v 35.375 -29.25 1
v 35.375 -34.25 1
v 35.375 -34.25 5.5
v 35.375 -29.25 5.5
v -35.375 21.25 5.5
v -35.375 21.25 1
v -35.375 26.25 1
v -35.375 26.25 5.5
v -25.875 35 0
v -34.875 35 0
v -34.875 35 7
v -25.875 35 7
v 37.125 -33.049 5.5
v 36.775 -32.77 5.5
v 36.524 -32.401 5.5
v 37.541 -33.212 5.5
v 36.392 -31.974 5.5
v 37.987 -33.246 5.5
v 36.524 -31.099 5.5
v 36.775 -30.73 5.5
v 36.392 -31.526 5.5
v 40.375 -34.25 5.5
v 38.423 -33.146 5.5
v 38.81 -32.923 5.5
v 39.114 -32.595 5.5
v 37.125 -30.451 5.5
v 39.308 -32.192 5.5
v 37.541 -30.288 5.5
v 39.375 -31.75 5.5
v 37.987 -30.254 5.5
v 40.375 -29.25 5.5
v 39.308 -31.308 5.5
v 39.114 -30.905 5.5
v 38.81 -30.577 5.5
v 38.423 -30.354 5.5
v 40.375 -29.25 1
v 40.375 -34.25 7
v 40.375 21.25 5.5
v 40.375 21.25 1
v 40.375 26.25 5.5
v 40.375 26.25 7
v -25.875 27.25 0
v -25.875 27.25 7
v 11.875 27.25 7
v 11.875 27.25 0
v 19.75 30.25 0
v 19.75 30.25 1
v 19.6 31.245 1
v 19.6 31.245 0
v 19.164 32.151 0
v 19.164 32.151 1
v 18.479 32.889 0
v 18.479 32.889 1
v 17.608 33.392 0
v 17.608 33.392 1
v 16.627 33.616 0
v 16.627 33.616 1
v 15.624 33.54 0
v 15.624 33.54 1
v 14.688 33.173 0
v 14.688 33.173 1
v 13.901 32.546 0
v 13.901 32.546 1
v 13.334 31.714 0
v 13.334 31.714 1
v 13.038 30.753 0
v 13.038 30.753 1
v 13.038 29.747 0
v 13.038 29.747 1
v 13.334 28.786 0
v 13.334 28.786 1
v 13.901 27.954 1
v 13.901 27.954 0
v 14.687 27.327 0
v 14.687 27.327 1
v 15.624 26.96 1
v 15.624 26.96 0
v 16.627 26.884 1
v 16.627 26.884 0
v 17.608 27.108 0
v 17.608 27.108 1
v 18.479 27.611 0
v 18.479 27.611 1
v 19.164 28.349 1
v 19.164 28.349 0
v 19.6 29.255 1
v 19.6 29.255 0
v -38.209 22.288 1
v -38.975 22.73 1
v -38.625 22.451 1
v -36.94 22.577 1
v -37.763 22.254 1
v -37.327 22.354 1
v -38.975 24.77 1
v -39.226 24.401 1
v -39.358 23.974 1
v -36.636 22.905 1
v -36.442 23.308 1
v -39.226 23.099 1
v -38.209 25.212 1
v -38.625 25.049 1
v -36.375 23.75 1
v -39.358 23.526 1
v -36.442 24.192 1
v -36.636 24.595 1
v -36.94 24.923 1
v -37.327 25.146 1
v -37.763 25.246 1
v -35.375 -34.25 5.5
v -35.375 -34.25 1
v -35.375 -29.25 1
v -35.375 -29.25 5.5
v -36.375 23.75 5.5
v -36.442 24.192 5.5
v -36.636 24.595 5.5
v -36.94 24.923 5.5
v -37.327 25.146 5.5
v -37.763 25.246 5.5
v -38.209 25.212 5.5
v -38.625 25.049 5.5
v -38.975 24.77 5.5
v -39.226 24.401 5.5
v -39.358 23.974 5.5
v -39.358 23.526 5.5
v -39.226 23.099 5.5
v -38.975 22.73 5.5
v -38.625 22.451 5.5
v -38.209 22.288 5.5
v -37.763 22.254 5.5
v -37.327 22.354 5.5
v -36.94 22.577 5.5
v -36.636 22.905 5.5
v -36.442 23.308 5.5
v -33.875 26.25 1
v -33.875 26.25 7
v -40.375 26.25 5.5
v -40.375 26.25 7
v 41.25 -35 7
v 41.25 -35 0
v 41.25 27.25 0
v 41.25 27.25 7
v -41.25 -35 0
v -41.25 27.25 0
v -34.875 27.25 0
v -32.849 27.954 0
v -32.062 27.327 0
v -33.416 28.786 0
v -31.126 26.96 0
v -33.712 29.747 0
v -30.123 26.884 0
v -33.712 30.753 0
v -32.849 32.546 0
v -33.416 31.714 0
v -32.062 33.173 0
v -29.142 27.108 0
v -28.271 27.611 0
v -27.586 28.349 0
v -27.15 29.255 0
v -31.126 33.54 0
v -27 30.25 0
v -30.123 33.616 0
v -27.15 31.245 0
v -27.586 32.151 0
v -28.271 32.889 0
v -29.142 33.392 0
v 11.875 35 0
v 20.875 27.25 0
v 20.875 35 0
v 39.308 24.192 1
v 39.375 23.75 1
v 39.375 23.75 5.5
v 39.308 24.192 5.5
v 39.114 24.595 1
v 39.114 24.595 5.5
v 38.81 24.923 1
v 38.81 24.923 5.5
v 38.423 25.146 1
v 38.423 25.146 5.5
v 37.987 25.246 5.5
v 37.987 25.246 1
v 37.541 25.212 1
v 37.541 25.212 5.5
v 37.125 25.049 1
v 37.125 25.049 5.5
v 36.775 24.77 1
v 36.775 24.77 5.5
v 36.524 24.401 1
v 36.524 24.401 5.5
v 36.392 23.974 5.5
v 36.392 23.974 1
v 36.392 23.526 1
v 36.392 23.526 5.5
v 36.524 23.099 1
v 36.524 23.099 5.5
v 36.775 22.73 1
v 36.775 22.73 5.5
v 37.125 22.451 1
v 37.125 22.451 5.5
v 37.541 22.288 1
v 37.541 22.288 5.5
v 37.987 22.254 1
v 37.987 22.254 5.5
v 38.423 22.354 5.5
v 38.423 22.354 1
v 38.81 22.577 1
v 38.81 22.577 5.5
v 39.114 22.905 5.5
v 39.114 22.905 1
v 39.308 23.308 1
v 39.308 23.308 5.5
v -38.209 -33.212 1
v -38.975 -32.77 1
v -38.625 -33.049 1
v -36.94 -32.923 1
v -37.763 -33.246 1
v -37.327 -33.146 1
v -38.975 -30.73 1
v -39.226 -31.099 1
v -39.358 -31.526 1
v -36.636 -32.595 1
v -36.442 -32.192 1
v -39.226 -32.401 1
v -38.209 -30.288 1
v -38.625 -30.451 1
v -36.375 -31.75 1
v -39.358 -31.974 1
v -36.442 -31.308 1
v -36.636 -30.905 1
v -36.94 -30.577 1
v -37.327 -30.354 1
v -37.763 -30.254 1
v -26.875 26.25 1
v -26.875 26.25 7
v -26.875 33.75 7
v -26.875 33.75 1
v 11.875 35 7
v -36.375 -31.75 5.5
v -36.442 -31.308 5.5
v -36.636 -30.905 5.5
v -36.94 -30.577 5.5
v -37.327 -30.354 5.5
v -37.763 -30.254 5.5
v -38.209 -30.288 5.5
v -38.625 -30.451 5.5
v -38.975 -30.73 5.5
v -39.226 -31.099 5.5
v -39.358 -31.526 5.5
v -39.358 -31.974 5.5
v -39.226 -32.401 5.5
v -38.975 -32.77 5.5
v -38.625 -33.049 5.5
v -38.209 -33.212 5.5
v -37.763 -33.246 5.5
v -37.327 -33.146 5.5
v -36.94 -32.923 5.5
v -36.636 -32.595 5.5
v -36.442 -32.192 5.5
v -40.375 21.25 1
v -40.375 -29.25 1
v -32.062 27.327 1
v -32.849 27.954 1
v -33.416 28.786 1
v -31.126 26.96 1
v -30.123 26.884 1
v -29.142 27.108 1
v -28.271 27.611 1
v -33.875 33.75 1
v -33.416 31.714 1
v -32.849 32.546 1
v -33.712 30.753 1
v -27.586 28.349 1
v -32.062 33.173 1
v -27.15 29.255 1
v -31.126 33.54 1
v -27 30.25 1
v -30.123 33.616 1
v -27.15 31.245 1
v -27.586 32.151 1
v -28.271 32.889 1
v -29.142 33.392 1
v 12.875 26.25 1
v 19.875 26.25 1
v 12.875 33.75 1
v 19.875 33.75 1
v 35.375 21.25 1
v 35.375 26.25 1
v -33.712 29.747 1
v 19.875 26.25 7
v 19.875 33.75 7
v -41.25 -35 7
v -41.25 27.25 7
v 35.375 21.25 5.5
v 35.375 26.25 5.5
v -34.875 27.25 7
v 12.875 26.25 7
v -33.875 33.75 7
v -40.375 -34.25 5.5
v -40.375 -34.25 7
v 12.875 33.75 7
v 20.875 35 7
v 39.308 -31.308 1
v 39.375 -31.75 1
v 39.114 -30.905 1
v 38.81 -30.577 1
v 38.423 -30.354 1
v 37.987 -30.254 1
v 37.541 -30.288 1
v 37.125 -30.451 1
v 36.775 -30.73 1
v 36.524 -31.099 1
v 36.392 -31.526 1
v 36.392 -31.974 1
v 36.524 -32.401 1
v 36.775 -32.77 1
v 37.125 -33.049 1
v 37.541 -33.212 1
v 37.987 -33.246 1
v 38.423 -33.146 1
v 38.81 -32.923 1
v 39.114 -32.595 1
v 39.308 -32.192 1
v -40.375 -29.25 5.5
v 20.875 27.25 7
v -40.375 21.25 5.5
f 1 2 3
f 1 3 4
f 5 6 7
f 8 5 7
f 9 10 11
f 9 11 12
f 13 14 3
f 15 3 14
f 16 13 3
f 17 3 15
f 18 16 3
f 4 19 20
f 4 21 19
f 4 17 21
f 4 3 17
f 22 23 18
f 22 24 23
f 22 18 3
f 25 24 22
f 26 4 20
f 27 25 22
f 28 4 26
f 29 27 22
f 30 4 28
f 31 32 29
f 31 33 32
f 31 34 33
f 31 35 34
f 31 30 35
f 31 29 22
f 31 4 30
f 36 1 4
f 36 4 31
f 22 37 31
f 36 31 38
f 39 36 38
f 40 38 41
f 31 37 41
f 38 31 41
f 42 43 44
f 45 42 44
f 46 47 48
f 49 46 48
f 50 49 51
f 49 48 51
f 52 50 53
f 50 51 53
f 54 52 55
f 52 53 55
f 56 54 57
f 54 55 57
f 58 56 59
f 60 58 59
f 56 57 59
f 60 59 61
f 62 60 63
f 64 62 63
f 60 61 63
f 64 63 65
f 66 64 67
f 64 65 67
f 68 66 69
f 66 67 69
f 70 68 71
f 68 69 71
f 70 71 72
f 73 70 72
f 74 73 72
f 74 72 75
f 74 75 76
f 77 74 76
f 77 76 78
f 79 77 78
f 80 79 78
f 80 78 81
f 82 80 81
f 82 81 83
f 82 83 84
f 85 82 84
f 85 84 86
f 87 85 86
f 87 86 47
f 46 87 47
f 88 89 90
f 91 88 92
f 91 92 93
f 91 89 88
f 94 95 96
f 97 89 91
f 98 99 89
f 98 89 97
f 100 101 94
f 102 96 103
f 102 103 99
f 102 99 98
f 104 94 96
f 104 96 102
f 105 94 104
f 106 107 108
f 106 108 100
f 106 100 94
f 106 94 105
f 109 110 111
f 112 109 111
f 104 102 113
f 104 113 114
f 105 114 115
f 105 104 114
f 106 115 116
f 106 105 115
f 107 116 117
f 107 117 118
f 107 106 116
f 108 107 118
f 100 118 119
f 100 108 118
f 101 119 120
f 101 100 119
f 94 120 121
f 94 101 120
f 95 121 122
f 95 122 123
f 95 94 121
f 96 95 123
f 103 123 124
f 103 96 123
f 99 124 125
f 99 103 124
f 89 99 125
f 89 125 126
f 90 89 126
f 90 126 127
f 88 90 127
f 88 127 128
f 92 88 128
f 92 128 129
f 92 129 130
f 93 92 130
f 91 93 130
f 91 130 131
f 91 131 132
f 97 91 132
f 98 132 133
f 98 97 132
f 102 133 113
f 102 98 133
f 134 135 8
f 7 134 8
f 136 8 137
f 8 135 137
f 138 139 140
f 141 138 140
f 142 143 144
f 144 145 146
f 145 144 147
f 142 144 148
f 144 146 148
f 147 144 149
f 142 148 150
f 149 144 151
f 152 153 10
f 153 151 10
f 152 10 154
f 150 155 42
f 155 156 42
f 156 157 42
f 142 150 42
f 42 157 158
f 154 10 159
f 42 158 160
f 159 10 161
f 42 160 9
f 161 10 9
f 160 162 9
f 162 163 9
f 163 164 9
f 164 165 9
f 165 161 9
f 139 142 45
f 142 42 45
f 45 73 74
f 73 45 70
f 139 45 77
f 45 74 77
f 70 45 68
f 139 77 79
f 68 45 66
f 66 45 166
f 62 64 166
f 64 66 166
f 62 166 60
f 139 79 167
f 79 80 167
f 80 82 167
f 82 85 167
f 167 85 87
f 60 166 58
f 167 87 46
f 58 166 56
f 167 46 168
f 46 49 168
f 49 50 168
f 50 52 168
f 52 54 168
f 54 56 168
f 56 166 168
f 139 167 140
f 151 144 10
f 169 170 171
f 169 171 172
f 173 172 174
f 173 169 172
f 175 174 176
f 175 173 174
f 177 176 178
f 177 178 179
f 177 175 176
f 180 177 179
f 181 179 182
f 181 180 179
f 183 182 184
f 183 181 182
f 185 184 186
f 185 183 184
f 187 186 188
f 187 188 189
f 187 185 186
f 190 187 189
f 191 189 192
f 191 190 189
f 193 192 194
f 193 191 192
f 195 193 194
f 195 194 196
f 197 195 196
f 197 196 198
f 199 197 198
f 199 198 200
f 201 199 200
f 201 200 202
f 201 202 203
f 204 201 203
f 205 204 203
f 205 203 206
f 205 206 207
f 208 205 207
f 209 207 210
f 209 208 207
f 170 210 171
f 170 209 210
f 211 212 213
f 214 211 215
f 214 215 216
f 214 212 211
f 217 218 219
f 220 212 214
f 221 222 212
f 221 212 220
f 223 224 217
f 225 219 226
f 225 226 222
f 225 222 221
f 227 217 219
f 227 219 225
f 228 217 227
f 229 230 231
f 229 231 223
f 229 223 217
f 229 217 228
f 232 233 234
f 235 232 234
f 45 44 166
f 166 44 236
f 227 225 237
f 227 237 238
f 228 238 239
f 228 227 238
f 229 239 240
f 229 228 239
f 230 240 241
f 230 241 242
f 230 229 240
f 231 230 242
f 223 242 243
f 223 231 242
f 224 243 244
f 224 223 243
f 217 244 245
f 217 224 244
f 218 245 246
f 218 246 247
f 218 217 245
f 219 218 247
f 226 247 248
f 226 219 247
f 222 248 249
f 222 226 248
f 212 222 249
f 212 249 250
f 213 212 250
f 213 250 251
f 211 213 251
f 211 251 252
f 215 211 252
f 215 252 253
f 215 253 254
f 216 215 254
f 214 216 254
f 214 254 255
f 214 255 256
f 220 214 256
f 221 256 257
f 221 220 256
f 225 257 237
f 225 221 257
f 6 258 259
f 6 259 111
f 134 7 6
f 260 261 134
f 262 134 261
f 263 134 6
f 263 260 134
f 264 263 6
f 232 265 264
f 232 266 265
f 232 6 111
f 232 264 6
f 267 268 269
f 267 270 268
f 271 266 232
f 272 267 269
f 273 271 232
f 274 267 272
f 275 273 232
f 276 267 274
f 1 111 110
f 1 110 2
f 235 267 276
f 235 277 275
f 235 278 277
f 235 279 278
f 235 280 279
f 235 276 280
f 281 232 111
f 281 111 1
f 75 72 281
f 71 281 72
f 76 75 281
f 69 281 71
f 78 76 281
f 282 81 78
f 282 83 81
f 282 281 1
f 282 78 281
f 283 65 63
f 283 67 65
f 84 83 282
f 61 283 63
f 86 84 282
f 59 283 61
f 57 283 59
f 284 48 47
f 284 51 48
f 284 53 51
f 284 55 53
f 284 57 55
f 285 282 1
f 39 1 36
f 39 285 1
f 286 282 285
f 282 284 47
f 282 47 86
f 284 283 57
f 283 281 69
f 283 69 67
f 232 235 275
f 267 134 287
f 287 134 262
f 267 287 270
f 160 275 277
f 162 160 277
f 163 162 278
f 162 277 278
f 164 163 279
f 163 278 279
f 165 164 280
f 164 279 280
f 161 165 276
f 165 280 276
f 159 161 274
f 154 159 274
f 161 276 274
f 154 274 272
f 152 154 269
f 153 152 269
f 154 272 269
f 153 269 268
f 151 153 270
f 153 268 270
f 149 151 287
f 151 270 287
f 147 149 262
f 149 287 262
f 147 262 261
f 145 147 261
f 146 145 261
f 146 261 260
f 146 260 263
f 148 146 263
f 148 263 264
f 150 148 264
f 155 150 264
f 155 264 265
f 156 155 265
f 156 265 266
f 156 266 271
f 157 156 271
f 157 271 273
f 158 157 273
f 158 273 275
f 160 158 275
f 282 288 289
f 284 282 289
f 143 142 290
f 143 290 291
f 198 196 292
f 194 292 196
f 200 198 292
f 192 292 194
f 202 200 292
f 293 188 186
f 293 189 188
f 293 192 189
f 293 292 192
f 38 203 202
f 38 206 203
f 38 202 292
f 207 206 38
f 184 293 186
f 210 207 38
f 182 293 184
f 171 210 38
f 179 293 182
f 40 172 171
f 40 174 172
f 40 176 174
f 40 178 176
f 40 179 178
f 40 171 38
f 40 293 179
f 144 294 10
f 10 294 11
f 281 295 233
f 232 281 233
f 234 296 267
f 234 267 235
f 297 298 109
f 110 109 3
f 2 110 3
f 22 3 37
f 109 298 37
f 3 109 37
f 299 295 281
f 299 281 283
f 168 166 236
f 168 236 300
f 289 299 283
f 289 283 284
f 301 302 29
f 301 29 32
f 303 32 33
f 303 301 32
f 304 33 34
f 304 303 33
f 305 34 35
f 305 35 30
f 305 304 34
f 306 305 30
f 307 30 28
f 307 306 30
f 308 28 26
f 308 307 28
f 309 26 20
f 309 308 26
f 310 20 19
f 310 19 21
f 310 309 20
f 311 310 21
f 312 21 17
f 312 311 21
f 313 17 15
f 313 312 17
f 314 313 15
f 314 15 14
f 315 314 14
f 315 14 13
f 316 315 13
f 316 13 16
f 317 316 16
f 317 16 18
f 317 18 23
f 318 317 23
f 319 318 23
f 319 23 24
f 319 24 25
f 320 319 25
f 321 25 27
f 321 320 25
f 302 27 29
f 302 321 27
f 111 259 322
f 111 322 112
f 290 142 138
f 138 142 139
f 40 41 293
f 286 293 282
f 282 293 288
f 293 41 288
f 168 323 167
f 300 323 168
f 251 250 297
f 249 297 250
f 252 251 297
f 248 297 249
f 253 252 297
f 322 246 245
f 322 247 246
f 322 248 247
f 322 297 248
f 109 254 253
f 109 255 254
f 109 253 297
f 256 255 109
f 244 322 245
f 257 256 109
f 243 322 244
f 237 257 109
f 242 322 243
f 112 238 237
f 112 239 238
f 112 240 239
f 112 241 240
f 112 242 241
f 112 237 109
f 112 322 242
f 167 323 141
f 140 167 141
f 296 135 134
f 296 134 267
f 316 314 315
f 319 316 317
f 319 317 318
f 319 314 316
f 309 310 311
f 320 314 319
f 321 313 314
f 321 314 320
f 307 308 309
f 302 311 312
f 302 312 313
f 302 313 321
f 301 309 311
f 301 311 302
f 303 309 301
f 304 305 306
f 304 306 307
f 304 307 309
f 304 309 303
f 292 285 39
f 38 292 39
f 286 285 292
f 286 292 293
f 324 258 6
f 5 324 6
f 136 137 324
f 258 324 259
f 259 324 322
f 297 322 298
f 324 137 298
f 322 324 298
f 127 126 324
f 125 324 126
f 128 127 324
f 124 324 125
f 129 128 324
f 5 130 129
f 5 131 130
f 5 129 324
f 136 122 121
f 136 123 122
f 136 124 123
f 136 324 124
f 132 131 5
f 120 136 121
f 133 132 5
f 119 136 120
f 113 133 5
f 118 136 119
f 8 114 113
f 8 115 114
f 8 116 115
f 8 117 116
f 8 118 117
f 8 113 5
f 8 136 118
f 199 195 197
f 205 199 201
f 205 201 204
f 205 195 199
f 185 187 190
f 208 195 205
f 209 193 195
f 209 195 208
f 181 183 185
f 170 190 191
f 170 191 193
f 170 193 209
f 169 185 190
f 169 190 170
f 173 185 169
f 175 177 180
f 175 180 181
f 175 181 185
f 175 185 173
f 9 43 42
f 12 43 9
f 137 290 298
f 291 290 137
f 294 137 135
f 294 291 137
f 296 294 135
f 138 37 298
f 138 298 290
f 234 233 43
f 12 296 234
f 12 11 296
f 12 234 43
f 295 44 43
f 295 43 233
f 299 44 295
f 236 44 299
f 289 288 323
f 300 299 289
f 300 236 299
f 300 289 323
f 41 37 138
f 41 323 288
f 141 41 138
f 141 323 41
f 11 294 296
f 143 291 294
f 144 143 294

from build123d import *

# Parameters (mm, degrees)
F0_W     = 82.5
F0_H     = 70
F1_DEPTH = 7
F2_W     = 7
F2_H     = 7.5
F3_DEPTH = 6
F4_R     = 3.375
F5_DEPTH = 25
F6_W     = 5
F6_H     = 5
F6_R     = 1.5
F7_DEPTH = 4.5
F8_W     = 6.375
F8_H     = 7.75
F8_W_2   = 37.75
F8_W_3   = 20.375
F9_DEPTH = 25


with BuildPart() as f1:
    # F0 (on Top) → F1 (new body)
    with BuildSketch(Plane.XY):
        Rectangle(F0_W, F0_H)
    extrude(amount=F1_DEPTH)

    # F2 (on face) → F3 (cut)
    with BuildSketch(Plane.XY.offset(7)):
        Polygon((40.375, -34.25), (40.375, 26.25), (19.875, 26.25), (12.875, 26.25), (-26.875, 26.25), (-33.875, 26.25), (-40.375, 26.25), (-40.375, -34.25), align=None)
        with Locations((-30.375, 30)):
            Rectangle(F2_W, F2_H)
        with Locations((16.375, 30)):
            Rectangle(F2_W, F2_H)
    extrude(amount=-F3_DEPTH, mode=Mode.SUBTRACT)

    # F4 (on face) → F5 (cut)
    with BuildSketch(Plane.XY.offset(1)):
        with Locations((-30.375, 30.25)):
            Circle(F4_R)
        with Locations((16.375, 30.25)):
            Circle(F4_R)
    extrude(amount=-F5_DEPTH, mode=Mode.SUBTRACT)

    # F6 (on face) → F7 (join)
    with BuildSketch(Plane.XY.offset(1)):
        with Locations((37.875, 23.75)):
            Rectangle(F6_W, F6_H)
        with Locations((37.875, 23.75)):
            Circle(F6_R, mode=Mode.SUBTRACT)
        with Locations((37.875, -31.75)):
            Rectangle(F6_W, F6_H)
        with Locations((37.875, -31.75)):
            Circle(F6_R, mode=Mode.SUBTRACT)
        with Locations((-37.875, -31.75)):
            Rectangle(F6_W, F6_H)
        with Locations((-37.875, -31.75)):
            Circle(F6_R, mode=Mode.SUBTRACT)
        Polygon((-35.375, 26.25), (-40.375, 26.25), (-40.375, 21.25), (-35.375, 21.25), (-35.375, 23.75), align=None)
        with Locations((-37.875, 23.75)):
            Circle(F6_R, mode=Mode.SUBTRACT)
    extrude(amount=F7_DEPTH)

    # F8 (on face) → F9 (cut)
    with BuildSketch(Plane.XY.offset(7)):
        with Locations((-38.0625, 31.125)):
            Rectangle(F8_W, F8_H)
        with Locations((-7, 31.125)):
            Rectangle(F8_W_2, F8_H)
        with Locations((31.0625, 31.125)):
            Rectangle(F8_W_3, F8_H)
    extrude(amount=-F9_DEPTH, mode=Mode.SUBTRACT)


solid = f1.part
